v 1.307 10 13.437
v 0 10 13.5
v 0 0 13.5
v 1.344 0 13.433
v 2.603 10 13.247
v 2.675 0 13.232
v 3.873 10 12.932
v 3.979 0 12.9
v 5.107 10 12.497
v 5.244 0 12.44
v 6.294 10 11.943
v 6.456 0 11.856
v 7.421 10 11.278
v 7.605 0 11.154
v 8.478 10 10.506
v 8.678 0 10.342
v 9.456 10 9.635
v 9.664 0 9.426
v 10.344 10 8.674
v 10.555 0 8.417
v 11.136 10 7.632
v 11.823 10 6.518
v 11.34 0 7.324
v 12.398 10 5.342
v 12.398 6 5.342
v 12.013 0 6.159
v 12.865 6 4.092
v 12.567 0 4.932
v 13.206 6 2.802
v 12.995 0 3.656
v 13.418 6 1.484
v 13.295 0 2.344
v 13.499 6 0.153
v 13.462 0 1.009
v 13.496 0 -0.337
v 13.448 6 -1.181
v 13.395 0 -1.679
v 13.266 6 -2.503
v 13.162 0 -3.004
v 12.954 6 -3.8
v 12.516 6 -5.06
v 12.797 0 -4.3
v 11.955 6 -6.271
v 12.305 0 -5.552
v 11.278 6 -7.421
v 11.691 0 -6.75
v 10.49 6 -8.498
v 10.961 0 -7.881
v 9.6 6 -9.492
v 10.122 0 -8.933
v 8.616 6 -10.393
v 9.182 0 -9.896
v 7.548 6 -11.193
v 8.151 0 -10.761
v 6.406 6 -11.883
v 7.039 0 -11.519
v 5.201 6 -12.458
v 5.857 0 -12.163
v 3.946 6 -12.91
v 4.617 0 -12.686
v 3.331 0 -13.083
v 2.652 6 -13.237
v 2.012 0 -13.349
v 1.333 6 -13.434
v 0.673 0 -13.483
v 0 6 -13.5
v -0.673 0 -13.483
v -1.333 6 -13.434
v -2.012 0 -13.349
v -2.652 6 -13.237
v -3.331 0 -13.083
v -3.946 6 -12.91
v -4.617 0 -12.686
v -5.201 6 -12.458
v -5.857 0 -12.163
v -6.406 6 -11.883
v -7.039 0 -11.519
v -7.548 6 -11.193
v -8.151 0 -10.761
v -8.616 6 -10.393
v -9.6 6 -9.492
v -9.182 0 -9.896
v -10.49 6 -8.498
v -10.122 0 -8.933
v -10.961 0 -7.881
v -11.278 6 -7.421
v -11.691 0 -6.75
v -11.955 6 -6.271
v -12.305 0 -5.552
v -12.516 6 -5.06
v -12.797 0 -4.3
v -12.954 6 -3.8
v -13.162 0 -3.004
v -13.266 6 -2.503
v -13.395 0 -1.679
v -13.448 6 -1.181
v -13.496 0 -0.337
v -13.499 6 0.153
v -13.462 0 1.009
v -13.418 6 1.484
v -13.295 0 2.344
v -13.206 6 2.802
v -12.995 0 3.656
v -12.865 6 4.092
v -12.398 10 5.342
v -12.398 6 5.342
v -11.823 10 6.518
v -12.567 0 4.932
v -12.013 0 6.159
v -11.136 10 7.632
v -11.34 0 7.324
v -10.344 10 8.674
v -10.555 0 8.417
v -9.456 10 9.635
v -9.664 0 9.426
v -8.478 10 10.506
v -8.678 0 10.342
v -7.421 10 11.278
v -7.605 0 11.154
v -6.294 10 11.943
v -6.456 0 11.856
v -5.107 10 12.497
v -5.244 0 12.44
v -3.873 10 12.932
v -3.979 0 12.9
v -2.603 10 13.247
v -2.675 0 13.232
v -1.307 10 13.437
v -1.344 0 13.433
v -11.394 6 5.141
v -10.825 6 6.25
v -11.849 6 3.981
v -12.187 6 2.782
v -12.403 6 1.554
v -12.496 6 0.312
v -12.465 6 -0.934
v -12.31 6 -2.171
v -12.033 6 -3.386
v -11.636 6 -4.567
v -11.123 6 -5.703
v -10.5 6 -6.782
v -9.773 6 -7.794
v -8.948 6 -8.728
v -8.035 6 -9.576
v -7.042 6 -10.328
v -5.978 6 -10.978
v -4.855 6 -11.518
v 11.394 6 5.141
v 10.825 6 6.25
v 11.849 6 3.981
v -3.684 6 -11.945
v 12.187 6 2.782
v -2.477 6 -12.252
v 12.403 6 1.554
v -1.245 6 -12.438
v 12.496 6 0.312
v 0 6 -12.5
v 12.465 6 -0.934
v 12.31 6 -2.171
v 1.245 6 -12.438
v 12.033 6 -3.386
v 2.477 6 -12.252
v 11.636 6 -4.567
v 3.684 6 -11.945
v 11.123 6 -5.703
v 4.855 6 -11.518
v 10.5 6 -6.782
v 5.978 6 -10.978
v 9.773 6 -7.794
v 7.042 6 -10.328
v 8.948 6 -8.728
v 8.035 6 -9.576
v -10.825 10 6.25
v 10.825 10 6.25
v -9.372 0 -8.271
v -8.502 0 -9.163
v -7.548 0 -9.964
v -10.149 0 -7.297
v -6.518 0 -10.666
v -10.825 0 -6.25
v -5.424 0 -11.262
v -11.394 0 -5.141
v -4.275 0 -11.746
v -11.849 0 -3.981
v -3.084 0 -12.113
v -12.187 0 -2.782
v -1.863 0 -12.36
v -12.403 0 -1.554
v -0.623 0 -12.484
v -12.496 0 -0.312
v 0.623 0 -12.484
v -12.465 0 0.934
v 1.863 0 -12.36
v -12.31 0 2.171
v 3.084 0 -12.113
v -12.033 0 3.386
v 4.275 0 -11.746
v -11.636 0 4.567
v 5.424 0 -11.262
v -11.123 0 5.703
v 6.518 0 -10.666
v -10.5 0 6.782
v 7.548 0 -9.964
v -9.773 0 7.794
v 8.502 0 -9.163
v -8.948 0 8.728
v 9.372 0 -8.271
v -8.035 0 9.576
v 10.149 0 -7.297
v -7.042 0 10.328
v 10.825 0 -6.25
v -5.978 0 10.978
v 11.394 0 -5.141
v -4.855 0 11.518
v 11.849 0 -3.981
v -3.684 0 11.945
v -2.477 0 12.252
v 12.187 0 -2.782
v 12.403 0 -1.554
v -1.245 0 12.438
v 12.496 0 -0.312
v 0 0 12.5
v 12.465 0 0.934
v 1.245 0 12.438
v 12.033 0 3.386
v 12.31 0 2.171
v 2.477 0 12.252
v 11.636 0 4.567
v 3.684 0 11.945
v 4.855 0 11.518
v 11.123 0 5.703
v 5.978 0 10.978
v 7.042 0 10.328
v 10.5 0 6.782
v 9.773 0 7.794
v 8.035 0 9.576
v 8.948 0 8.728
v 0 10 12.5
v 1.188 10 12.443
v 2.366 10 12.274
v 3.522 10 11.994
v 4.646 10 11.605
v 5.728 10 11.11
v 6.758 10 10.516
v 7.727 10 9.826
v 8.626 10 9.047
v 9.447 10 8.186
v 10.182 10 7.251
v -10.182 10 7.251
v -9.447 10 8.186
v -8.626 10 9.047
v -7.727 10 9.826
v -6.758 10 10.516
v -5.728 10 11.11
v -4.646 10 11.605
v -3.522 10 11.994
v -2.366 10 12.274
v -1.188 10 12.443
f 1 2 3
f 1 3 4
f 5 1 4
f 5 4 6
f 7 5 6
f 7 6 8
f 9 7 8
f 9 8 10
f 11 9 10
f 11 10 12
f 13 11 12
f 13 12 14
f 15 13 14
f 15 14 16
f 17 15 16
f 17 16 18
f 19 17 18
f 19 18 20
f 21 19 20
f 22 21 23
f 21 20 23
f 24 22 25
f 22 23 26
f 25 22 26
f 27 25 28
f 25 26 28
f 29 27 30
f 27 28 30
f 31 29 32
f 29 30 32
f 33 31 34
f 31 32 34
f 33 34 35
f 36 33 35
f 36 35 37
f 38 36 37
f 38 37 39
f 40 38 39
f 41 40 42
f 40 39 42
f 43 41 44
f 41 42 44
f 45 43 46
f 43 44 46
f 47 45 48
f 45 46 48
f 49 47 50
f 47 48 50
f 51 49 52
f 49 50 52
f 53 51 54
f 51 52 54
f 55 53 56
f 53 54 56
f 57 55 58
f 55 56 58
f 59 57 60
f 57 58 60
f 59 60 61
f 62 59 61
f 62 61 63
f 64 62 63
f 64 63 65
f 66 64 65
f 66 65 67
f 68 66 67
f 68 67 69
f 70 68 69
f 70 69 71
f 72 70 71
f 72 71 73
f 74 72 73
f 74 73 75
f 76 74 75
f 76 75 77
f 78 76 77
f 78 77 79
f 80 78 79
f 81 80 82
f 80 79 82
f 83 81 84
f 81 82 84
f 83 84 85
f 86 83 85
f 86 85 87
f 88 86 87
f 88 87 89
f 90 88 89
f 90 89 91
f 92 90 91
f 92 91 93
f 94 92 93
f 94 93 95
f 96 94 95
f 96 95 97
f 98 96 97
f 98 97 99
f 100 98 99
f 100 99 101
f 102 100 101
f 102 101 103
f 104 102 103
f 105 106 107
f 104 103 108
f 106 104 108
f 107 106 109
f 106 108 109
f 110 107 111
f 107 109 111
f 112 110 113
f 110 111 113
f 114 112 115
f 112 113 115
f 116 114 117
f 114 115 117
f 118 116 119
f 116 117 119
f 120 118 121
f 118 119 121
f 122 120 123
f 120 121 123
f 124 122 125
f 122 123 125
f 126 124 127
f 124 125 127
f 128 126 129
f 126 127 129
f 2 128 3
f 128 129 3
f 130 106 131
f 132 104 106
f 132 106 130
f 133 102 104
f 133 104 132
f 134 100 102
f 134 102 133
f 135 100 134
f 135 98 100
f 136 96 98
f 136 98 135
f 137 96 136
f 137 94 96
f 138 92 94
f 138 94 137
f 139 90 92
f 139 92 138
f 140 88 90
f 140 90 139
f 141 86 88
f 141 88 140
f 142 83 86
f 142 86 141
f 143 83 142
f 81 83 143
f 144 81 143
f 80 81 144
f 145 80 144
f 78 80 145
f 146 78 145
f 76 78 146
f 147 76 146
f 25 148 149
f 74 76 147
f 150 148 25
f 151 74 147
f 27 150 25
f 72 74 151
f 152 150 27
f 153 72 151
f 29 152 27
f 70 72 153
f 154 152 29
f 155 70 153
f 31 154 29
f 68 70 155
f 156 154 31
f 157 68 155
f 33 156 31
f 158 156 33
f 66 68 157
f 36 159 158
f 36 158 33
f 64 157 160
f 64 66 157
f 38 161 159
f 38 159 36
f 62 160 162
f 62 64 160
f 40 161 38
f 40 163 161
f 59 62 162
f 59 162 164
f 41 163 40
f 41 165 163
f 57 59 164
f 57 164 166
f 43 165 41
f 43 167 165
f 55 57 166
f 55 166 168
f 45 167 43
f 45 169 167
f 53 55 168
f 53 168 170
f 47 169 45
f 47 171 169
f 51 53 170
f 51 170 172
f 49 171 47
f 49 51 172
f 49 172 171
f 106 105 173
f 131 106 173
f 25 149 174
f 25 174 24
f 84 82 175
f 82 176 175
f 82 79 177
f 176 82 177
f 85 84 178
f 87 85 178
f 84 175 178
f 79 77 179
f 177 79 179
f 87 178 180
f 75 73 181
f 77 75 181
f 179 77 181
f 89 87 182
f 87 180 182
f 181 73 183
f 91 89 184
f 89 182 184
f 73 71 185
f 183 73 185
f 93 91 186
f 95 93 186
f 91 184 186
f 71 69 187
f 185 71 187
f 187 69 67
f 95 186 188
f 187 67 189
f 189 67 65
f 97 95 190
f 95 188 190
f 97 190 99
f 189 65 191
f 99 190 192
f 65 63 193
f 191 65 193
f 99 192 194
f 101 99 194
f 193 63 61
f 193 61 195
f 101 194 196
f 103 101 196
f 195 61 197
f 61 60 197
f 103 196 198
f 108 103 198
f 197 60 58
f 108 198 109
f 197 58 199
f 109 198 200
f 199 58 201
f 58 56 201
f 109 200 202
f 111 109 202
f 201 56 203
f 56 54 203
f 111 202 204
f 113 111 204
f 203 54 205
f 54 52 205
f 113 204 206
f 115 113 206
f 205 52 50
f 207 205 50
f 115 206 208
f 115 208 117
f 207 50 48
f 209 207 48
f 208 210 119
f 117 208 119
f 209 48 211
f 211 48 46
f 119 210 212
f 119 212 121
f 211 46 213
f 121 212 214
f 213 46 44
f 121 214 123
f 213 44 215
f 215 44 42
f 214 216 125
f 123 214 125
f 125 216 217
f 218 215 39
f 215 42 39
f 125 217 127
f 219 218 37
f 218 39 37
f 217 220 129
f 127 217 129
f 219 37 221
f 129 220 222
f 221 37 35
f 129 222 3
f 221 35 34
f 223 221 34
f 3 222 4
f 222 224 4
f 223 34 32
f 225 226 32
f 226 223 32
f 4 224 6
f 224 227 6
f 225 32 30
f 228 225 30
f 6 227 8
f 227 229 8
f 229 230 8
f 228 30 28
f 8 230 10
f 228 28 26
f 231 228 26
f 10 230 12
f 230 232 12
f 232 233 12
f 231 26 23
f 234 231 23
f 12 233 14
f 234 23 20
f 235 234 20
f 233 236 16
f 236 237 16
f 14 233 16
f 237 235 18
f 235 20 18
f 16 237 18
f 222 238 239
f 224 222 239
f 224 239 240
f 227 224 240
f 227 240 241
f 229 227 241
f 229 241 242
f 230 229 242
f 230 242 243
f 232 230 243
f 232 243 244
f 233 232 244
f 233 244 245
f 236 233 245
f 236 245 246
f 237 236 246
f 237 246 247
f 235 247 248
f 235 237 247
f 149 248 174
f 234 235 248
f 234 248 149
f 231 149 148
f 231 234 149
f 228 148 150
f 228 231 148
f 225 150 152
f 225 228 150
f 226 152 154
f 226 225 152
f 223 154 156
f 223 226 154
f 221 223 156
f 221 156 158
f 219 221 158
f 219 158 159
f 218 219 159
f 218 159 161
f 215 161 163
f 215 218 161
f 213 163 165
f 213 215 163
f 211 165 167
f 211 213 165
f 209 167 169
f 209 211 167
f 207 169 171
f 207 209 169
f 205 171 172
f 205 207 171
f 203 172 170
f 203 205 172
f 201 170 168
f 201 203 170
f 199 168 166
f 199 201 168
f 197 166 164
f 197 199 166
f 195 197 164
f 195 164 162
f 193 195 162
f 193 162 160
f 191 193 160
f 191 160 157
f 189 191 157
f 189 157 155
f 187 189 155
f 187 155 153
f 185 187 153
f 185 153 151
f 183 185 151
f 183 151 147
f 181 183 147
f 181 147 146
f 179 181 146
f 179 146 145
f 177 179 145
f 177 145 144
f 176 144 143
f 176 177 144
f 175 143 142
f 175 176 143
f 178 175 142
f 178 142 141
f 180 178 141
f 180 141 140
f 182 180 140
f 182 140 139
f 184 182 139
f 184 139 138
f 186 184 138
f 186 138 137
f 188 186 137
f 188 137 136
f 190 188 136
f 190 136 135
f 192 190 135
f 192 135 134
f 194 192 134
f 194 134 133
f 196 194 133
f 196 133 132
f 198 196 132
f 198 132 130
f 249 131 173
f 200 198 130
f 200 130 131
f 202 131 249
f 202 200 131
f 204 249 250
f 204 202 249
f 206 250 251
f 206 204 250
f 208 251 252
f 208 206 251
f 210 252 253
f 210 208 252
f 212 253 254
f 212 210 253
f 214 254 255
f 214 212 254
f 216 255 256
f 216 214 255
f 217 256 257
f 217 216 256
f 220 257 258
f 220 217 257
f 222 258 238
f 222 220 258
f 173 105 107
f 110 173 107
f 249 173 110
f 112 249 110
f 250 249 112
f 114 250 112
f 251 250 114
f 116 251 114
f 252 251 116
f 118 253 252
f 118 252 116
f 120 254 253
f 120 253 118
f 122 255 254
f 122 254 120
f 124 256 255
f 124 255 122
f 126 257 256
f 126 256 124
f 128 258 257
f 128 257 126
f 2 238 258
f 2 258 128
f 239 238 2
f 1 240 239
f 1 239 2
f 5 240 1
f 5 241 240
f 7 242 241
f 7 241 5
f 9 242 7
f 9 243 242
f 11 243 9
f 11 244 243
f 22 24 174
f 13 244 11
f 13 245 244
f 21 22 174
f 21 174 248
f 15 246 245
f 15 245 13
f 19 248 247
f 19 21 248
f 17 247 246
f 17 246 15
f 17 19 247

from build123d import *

# Parameters (mm, degrees)
SKETCH1_R           = 13.5
SKETCH1_R_2         = 12.5
BOSS_EXTRUDE1_DEPTH = 10
CUT_EXTRUDE1_DEPTH  = 4


with BuildPart() as part:
    # Sketch1 → Boss-Extrude1 (new body)
    with BuildSketch(Plane(origin=(0, 0, 0), x_dir=(1, 0, 0), z_dir=(0, 1, 0))):
        with Locations(Location((0, 0, 0), (0, 0, 270))):
            Circle(SKETCH1_R)
        with Locations(Location((0, 0, 0), (0, 0, 270))):
            Circle(SKETCH1_R_2, mode=Mode.SUBTRACT)
    extrude(amount=BOSS_EXTRUDE1_DEPTH)

    # Sketch2 → Cut-Extrude1 (cut)
    with BuildSketch(Plane(origin=(0, 10, 0), x_dir=(1, 0, 0), z_dir=(0, 1, 0))):
        Polygon((-45.033320997, 13.5), (0, -12.5), (45.033320997, 13.5), align=None)
    extrude(amount=-CUT_EXTRUDE1_DEPTH, mode=Mode.SUBTRACT)


solid = part.part
